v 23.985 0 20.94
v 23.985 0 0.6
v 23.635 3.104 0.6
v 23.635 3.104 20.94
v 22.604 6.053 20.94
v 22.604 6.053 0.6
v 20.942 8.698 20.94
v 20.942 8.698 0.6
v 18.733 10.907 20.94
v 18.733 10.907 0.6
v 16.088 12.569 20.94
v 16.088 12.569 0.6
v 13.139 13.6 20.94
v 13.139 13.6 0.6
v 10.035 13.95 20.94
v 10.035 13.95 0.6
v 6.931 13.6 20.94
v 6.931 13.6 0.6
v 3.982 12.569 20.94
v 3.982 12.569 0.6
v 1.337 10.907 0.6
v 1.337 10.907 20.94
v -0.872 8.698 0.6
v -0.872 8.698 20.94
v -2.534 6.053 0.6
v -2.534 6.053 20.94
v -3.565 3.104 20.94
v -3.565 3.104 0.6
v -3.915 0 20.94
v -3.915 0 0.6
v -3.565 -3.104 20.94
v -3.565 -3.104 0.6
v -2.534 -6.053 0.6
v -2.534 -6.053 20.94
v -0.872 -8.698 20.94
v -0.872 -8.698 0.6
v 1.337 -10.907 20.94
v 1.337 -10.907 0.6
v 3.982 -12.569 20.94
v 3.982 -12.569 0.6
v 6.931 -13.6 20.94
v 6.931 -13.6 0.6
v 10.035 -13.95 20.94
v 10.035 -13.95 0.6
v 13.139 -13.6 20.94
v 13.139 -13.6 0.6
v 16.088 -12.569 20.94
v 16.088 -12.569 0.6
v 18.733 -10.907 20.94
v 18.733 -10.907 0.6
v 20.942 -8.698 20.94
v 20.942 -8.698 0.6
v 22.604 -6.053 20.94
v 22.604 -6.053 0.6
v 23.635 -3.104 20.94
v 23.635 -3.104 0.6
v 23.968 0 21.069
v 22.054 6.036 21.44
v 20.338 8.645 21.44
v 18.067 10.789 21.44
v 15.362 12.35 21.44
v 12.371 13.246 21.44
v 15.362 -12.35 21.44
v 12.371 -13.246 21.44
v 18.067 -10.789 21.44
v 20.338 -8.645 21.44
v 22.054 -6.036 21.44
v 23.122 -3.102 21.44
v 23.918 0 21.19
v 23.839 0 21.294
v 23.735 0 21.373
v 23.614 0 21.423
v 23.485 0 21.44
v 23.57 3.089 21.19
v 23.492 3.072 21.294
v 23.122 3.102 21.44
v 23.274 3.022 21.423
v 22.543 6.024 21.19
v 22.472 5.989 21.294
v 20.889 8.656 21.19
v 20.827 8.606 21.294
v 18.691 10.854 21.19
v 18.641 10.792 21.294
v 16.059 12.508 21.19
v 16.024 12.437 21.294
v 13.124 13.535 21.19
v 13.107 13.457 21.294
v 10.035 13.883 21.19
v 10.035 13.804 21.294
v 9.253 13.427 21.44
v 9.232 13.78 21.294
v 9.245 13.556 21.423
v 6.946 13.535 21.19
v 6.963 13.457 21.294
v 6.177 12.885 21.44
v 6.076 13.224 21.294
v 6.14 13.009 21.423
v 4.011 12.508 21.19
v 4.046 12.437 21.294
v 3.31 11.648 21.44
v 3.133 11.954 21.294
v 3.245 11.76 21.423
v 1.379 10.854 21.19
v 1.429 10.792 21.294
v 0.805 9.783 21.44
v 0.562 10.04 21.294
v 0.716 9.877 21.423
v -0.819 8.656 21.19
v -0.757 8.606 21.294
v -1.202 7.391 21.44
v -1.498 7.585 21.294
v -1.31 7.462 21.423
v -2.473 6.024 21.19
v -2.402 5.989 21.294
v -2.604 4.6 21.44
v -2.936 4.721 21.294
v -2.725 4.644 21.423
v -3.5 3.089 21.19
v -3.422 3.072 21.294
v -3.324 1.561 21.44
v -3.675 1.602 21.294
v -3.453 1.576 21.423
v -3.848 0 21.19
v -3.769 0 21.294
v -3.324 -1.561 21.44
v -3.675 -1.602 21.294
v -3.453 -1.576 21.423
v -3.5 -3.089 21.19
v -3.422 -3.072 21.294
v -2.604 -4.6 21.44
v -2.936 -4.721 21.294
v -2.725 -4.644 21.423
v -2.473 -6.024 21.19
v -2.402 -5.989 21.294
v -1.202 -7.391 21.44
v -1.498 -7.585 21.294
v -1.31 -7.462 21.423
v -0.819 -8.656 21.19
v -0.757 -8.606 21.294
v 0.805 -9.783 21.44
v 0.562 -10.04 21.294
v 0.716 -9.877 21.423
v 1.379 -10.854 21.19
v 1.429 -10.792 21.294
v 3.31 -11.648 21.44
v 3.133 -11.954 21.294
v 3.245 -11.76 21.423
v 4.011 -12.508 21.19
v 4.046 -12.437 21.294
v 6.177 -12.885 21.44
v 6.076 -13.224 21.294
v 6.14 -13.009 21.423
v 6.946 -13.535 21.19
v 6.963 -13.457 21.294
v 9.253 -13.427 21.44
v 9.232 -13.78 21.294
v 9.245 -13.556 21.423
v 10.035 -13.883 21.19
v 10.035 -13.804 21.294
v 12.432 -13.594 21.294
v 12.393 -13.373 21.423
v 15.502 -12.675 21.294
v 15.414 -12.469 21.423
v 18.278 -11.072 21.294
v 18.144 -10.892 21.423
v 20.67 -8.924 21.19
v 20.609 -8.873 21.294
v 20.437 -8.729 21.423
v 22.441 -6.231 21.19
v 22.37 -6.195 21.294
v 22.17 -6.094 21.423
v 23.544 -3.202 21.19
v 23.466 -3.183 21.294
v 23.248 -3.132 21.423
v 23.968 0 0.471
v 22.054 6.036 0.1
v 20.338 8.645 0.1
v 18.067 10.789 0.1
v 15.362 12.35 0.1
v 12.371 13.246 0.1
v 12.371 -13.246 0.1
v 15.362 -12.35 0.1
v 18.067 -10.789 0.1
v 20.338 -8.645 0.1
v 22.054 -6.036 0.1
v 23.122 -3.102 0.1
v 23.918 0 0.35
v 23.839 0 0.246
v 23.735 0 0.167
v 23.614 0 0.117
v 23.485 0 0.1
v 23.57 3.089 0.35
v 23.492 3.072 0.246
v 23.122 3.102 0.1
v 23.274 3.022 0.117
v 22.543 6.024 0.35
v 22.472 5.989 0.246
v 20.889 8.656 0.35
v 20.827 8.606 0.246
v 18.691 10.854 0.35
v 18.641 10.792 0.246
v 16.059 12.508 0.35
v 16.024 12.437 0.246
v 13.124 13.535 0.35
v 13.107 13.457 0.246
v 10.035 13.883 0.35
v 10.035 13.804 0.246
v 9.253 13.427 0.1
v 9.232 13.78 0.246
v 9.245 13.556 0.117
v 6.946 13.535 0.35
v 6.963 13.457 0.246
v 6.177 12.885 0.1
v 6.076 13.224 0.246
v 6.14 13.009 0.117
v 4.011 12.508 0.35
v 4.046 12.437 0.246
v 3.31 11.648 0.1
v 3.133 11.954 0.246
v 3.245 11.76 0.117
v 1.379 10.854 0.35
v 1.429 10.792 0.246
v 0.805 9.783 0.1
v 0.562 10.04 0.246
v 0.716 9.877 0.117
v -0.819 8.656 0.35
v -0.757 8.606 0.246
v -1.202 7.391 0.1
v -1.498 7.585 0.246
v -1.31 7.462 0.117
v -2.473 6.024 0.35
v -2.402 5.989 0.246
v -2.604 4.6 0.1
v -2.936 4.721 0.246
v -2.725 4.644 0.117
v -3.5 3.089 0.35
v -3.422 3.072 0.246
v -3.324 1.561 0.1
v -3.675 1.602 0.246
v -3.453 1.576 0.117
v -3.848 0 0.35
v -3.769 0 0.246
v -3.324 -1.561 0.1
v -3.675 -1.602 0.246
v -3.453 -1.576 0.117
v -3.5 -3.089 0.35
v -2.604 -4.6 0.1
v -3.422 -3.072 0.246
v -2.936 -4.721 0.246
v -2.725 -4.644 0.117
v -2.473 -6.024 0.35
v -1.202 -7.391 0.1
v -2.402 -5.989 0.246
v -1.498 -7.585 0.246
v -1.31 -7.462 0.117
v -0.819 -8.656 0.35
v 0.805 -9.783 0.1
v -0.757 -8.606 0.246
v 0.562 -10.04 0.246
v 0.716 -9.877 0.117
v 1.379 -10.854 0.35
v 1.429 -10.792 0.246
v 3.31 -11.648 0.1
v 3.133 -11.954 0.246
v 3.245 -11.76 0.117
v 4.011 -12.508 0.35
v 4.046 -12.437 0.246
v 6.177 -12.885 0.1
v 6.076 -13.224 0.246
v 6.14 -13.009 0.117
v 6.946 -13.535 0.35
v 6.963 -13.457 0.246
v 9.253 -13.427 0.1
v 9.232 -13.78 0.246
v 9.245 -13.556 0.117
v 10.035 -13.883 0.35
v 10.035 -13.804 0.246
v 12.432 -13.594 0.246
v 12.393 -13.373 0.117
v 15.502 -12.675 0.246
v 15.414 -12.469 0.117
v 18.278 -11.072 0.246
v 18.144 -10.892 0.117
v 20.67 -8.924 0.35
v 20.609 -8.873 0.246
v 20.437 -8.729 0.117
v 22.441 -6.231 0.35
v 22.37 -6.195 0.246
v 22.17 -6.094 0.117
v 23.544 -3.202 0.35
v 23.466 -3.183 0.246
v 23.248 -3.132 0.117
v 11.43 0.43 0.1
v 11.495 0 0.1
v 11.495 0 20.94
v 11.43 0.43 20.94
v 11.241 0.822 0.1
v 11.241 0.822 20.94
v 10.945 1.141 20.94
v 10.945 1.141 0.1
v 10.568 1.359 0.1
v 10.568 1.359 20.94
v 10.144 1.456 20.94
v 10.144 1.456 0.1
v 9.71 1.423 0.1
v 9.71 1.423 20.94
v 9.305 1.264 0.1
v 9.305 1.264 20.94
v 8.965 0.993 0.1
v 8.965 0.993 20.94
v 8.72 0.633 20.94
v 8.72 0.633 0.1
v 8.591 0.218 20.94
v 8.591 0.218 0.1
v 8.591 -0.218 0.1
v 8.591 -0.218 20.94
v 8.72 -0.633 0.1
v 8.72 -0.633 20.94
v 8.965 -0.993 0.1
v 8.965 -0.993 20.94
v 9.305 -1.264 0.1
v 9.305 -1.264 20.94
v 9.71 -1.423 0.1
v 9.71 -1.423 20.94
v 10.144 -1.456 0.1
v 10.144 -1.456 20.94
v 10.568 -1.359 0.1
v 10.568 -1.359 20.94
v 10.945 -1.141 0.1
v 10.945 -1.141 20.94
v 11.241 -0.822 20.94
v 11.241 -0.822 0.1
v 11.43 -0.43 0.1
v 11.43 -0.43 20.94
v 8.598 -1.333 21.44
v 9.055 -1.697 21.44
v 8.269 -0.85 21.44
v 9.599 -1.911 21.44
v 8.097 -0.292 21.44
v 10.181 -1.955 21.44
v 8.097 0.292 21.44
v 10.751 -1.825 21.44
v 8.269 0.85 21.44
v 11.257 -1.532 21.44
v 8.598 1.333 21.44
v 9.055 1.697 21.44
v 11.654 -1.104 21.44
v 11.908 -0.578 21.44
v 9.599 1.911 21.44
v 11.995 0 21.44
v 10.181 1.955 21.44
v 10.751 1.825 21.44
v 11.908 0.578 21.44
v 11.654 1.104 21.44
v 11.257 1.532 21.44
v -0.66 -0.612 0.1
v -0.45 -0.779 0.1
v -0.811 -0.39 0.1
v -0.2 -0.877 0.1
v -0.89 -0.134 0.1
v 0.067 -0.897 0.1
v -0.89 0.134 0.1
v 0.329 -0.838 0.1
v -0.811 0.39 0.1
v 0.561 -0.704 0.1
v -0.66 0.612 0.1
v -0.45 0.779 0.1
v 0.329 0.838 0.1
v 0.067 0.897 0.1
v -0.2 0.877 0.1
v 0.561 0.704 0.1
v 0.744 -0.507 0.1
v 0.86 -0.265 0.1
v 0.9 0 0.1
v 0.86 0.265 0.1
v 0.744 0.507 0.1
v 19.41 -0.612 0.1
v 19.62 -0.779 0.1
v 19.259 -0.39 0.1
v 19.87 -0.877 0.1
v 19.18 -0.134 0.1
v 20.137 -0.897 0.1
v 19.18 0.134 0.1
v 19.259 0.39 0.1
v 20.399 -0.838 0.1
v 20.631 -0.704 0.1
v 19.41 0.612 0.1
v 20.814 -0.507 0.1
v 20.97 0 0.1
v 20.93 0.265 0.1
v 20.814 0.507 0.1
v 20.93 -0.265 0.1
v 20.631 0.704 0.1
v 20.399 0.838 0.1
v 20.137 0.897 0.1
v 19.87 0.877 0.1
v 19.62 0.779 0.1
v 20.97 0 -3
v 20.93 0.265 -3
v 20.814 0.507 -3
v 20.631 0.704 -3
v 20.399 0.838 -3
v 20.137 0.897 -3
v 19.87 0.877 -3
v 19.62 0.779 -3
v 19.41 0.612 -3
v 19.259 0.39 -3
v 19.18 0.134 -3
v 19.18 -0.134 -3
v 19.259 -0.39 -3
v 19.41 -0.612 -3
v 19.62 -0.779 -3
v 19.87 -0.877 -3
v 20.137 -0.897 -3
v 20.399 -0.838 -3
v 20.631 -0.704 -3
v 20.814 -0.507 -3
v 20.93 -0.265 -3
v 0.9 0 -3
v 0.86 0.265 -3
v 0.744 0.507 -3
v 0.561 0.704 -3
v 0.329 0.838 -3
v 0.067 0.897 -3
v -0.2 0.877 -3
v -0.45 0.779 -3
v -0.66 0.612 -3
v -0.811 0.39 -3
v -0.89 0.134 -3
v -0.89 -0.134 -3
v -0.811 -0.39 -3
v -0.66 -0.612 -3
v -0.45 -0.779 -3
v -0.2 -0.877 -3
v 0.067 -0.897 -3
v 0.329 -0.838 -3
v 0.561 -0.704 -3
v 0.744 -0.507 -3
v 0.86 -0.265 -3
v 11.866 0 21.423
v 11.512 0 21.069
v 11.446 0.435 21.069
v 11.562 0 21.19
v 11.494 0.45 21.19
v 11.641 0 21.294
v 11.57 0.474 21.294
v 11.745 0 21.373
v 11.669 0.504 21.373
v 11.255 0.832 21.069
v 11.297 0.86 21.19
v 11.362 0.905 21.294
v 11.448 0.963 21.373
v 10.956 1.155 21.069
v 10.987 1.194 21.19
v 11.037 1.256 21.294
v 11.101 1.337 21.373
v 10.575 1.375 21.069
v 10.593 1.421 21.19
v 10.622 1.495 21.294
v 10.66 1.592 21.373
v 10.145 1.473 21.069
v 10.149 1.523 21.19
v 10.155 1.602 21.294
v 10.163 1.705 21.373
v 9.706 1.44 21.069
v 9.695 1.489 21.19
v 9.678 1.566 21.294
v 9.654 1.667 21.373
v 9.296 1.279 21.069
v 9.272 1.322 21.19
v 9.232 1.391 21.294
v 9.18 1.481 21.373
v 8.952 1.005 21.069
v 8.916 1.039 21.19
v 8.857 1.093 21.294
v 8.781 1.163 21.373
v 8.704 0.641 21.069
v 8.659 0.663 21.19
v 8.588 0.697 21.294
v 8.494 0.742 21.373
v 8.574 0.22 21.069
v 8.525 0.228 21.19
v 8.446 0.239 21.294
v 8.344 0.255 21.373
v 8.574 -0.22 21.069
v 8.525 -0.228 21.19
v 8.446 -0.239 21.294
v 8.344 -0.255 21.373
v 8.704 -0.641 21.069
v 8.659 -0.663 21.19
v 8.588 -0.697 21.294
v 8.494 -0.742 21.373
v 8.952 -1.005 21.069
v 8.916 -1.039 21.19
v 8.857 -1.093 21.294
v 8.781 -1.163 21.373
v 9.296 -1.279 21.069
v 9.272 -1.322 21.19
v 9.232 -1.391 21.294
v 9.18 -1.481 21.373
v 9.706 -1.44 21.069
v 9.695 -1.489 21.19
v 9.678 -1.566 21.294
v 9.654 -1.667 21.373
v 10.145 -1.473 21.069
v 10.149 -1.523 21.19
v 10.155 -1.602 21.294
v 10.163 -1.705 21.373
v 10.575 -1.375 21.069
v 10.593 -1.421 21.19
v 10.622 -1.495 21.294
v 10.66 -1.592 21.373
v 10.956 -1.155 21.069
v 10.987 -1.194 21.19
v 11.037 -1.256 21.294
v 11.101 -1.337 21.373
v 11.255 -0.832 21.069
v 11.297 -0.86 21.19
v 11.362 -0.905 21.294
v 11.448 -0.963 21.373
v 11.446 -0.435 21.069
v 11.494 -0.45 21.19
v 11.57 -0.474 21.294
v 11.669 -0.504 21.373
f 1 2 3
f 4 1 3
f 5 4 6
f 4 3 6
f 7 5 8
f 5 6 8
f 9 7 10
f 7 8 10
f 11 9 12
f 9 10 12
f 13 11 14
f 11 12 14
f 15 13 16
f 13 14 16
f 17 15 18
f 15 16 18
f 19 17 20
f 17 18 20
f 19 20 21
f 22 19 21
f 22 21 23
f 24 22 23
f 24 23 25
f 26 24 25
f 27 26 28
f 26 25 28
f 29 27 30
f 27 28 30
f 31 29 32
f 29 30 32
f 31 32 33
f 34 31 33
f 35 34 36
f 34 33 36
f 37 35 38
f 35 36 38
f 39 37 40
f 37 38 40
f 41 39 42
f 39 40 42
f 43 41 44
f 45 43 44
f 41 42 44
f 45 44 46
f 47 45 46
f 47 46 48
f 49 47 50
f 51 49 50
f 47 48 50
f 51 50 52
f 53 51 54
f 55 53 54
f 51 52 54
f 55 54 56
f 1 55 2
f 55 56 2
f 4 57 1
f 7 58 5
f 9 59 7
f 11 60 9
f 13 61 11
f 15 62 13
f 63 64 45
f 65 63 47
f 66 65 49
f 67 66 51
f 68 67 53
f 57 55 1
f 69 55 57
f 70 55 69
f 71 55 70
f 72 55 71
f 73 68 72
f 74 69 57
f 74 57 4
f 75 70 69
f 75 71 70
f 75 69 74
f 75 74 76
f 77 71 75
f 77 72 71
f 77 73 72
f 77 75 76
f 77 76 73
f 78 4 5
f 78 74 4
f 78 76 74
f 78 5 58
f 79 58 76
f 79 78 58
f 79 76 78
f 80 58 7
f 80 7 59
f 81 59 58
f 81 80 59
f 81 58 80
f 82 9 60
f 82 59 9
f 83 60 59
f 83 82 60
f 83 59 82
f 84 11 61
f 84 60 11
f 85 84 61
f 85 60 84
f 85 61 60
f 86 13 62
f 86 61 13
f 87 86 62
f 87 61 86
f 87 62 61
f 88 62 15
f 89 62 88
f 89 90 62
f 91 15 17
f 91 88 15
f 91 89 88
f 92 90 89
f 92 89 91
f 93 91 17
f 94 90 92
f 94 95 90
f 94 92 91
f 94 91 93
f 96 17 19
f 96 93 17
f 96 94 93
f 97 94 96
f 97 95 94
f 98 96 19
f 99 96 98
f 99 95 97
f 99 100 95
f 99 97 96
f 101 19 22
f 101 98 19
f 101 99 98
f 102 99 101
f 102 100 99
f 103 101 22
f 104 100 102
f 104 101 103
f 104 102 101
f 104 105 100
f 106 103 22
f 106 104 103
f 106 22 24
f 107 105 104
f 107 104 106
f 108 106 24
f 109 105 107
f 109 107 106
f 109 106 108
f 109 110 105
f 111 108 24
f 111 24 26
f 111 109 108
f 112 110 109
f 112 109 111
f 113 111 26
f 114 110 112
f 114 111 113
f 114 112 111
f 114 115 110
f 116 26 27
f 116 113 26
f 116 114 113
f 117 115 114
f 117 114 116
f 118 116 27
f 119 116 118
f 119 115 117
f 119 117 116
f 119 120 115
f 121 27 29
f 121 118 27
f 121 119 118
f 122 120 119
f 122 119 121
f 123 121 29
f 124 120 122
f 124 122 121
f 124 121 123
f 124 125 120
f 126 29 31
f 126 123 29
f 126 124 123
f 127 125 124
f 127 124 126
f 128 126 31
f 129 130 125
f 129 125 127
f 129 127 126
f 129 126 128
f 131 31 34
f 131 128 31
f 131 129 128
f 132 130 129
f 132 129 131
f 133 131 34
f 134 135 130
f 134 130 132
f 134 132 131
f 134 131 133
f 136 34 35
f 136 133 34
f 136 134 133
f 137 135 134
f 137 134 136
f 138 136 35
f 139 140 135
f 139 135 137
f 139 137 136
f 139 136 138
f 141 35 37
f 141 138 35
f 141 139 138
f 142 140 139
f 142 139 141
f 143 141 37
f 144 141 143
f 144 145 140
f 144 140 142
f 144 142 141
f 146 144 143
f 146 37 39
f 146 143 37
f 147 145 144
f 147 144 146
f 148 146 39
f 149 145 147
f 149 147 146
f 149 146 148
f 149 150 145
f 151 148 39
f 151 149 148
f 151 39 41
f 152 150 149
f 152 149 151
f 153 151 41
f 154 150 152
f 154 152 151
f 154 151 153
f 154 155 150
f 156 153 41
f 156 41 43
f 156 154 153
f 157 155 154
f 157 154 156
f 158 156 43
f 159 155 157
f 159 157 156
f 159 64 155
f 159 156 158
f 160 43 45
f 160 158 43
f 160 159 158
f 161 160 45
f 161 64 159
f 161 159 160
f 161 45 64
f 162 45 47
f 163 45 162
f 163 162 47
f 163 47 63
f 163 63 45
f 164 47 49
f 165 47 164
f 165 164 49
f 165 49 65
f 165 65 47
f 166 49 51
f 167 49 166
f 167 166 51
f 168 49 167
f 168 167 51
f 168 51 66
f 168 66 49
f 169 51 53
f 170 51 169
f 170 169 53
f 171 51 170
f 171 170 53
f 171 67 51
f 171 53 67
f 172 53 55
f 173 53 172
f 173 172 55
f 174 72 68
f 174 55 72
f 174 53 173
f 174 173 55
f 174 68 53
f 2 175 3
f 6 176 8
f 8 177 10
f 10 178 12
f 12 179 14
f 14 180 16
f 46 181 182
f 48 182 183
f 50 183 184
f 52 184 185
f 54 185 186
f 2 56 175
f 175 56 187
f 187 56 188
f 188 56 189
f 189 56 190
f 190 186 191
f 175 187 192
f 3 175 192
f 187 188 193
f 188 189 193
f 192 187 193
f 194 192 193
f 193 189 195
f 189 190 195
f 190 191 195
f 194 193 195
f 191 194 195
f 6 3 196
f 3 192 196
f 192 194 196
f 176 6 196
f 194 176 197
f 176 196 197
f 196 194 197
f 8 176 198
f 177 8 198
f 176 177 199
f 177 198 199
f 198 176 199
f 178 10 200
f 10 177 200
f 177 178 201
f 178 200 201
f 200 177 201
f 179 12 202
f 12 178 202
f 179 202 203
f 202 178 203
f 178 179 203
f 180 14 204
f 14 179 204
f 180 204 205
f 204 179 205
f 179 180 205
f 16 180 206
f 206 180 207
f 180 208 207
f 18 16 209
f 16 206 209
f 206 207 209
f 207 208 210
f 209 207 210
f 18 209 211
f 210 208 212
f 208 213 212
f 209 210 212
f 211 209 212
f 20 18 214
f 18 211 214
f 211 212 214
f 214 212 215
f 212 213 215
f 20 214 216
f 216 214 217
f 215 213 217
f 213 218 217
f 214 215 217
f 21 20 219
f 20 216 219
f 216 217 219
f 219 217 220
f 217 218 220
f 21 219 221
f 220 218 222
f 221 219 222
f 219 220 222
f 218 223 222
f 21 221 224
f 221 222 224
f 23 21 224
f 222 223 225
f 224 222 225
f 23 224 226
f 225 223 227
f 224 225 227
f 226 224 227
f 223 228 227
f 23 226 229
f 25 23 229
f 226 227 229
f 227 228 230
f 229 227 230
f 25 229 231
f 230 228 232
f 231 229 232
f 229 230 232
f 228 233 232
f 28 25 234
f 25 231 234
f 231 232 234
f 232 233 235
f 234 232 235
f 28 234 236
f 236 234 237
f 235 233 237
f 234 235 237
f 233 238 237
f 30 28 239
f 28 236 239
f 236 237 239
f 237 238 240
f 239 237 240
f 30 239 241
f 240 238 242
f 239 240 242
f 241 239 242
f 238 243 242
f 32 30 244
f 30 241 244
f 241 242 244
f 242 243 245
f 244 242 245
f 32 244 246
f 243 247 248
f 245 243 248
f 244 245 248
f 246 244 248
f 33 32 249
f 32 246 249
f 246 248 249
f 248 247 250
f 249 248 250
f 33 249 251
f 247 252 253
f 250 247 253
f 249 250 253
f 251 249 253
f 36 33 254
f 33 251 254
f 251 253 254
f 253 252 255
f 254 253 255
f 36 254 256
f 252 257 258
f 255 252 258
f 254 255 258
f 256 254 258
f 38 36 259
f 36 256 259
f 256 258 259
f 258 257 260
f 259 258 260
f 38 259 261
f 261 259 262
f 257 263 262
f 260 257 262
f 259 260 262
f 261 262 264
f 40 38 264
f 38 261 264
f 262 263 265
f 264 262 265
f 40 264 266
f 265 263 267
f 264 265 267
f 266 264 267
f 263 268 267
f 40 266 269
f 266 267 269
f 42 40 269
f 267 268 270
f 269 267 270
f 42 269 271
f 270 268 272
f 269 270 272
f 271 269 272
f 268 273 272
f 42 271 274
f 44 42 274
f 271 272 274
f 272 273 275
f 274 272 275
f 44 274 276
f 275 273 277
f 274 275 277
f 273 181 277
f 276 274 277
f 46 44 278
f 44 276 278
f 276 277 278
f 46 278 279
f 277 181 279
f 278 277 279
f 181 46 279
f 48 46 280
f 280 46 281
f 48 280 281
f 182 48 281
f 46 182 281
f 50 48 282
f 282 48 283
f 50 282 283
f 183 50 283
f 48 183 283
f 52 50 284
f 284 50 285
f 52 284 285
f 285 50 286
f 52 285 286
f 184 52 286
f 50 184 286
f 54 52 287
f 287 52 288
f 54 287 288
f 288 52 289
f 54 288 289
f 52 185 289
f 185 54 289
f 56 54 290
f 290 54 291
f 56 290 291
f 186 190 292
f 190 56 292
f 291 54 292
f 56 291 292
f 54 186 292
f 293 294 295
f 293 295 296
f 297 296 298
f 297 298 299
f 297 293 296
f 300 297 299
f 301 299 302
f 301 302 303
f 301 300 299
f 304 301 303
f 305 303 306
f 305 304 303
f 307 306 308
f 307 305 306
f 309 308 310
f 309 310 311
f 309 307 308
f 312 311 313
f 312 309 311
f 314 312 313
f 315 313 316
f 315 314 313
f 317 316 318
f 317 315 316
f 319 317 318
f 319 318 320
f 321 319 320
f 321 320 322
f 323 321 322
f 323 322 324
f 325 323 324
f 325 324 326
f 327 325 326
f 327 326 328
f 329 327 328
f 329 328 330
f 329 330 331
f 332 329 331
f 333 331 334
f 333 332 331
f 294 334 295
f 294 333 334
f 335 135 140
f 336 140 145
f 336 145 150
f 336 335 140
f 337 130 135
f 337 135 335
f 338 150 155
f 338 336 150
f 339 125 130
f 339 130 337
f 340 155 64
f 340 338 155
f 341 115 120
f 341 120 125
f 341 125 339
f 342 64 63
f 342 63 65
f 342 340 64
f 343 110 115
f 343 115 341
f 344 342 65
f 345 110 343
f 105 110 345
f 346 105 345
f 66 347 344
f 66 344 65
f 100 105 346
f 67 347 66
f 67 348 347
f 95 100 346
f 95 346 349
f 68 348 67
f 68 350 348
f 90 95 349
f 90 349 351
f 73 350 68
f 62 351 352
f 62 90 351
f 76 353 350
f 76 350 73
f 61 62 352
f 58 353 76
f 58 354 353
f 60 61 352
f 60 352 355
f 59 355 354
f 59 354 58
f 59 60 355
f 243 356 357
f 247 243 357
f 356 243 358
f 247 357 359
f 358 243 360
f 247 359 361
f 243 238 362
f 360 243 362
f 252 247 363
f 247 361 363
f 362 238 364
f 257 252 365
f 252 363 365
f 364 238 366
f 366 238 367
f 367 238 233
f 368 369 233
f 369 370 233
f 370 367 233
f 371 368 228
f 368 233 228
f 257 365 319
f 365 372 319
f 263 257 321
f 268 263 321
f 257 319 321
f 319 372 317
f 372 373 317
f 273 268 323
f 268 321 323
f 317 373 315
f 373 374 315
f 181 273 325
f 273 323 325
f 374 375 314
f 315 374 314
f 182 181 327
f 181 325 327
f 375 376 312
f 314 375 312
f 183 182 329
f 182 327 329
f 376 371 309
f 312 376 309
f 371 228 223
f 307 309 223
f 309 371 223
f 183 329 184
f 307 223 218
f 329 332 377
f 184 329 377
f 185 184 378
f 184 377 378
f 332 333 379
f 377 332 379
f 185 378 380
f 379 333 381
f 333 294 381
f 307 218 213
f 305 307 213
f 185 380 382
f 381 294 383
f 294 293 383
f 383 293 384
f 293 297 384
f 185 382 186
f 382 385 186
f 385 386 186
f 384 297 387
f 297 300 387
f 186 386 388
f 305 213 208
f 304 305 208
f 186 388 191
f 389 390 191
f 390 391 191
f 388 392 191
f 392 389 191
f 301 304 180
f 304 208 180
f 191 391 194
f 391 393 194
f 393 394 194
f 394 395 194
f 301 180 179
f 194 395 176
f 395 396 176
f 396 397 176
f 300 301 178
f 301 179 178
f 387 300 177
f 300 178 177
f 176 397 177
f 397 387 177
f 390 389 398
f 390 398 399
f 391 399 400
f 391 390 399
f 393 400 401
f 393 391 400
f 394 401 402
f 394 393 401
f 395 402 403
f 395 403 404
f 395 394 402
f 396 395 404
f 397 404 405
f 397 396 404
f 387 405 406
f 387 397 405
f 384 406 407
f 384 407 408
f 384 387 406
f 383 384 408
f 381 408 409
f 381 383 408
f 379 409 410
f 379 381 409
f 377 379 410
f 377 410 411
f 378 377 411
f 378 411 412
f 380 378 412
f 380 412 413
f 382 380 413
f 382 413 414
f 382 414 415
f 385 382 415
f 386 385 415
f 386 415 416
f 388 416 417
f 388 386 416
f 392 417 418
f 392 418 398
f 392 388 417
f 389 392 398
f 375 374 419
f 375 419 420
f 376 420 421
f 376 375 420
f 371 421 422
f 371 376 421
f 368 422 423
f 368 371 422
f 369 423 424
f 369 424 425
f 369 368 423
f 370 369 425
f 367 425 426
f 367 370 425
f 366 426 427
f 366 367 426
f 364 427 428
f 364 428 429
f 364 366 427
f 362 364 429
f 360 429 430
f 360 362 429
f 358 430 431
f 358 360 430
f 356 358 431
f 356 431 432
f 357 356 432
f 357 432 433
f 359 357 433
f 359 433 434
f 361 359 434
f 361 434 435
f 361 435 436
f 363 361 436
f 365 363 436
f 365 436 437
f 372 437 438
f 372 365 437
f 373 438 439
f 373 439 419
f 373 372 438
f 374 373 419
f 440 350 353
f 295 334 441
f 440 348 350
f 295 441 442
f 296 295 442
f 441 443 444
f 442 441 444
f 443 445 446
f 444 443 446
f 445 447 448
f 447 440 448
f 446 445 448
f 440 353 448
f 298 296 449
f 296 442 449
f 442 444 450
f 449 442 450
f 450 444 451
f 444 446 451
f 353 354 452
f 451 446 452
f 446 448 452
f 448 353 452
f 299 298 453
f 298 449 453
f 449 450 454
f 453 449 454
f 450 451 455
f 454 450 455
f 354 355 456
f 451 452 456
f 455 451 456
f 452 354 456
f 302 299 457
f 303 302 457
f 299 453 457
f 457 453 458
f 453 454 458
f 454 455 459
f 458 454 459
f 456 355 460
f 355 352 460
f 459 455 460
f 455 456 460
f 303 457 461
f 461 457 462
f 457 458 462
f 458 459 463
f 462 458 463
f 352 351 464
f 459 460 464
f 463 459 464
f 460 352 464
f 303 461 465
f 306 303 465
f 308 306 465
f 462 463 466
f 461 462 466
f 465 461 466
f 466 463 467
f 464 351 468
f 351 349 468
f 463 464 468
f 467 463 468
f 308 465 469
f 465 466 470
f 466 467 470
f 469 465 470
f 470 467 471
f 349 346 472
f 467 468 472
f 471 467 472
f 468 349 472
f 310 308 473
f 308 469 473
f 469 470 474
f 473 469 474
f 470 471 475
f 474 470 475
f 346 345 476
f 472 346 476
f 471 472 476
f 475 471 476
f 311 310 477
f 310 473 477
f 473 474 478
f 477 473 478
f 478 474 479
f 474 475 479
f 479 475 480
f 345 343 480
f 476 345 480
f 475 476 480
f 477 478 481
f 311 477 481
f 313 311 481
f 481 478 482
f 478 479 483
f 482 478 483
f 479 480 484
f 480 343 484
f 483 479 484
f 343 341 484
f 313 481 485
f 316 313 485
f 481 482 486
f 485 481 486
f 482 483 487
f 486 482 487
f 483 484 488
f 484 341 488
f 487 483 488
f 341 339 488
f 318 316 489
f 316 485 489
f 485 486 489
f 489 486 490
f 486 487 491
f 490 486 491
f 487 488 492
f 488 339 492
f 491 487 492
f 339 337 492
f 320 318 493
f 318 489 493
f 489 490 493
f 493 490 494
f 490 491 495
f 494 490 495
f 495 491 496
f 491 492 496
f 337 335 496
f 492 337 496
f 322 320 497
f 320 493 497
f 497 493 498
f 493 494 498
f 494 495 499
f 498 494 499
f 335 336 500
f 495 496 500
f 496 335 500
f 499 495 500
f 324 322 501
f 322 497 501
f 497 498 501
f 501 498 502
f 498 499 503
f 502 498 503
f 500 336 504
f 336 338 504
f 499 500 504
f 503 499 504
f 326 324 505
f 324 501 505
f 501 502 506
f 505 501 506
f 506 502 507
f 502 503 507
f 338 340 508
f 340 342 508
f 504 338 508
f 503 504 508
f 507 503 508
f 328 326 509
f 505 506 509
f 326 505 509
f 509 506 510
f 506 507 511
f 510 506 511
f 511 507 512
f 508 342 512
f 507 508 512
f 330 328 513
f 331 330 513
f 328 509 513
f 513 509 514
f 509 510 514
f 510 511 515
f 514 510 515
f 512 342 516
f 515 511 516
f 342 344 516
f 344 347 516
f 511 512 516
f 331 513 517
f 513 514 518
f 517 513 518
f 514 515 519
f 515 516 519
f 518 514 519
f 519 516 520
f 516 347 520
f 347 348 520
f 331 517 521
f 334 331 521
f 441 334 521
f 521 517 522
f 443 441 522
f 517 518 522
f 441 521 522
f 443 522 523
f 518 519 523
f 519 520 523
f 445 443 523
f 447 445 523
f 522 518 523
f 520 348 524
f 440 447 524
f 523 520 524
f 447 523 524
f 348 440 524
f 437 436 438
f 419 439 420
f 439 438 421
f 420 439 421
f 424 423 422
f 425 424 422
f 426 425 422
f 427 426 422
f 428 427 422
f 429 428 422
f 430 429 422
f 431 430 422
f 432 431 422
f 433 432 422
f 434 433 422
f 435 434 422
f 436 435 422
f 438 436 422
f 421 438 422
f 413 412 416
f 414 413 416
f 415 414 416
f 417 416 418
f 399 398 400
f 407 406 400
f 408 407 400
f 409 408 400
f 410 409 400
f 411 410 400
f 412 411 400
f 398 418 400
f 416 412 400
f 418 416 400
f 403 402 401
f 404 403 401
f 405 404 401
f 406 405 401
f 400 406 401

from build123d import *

# Parameters (mm, degrees)
SKETCH001_R       = 0.9
PAD001_DEPTH      = 10.67
PAD001_DEPTH_BACK = 3.5
SKETCH_R          = 13.95
SKETCH_R_2        = 1.46
PAD_DEPTH         = 21.34
FILLET_R          = 0.5


with BuildPart() as pad001:
    # Sketch001 → Pad001 (new body, two sides)
    with BuildSketch(Plane.XY.offset(0.5)) as pad001_sk:
        Circle(SKETCH001_R)
        with Locations((20.07, 0)):
            Circle(SKETCH001_R)
    extrude(amount=PAD001_DEPTH)
    extrude(pad001_sk.sketch, amount=-PAD001_DEPTH_BACK)


with BuildPart() as fillet_mp_cp:
    # Sketch → Pad (new body)
    with BuildSketch(Plane.XY.offset(0.1)):
        with Locations((10.035, 0)):
            Circle(SKETCH_R)
        with Locations((10.035, 0)):
            Circle(SKETCH_R_2, mode=Mode.SUBTRACT)
    extrude(amount=PAD_DEPTH)

    # Fillet
    fillet_edges = [fillet_mp_cp.edges().sort_by_distance(p)[0] for p in [
        (8.575, 0, 21.44),
        (-3.915, 0, 21.44),
        (-3.915, 0, 0.1),
    ]]
    fillet(fillet_edges, radius=FILLET_R)

    # Fillet_mp_cp: union Pad001
    add(pad001.part)


solid = fillet_mp_cp.part
